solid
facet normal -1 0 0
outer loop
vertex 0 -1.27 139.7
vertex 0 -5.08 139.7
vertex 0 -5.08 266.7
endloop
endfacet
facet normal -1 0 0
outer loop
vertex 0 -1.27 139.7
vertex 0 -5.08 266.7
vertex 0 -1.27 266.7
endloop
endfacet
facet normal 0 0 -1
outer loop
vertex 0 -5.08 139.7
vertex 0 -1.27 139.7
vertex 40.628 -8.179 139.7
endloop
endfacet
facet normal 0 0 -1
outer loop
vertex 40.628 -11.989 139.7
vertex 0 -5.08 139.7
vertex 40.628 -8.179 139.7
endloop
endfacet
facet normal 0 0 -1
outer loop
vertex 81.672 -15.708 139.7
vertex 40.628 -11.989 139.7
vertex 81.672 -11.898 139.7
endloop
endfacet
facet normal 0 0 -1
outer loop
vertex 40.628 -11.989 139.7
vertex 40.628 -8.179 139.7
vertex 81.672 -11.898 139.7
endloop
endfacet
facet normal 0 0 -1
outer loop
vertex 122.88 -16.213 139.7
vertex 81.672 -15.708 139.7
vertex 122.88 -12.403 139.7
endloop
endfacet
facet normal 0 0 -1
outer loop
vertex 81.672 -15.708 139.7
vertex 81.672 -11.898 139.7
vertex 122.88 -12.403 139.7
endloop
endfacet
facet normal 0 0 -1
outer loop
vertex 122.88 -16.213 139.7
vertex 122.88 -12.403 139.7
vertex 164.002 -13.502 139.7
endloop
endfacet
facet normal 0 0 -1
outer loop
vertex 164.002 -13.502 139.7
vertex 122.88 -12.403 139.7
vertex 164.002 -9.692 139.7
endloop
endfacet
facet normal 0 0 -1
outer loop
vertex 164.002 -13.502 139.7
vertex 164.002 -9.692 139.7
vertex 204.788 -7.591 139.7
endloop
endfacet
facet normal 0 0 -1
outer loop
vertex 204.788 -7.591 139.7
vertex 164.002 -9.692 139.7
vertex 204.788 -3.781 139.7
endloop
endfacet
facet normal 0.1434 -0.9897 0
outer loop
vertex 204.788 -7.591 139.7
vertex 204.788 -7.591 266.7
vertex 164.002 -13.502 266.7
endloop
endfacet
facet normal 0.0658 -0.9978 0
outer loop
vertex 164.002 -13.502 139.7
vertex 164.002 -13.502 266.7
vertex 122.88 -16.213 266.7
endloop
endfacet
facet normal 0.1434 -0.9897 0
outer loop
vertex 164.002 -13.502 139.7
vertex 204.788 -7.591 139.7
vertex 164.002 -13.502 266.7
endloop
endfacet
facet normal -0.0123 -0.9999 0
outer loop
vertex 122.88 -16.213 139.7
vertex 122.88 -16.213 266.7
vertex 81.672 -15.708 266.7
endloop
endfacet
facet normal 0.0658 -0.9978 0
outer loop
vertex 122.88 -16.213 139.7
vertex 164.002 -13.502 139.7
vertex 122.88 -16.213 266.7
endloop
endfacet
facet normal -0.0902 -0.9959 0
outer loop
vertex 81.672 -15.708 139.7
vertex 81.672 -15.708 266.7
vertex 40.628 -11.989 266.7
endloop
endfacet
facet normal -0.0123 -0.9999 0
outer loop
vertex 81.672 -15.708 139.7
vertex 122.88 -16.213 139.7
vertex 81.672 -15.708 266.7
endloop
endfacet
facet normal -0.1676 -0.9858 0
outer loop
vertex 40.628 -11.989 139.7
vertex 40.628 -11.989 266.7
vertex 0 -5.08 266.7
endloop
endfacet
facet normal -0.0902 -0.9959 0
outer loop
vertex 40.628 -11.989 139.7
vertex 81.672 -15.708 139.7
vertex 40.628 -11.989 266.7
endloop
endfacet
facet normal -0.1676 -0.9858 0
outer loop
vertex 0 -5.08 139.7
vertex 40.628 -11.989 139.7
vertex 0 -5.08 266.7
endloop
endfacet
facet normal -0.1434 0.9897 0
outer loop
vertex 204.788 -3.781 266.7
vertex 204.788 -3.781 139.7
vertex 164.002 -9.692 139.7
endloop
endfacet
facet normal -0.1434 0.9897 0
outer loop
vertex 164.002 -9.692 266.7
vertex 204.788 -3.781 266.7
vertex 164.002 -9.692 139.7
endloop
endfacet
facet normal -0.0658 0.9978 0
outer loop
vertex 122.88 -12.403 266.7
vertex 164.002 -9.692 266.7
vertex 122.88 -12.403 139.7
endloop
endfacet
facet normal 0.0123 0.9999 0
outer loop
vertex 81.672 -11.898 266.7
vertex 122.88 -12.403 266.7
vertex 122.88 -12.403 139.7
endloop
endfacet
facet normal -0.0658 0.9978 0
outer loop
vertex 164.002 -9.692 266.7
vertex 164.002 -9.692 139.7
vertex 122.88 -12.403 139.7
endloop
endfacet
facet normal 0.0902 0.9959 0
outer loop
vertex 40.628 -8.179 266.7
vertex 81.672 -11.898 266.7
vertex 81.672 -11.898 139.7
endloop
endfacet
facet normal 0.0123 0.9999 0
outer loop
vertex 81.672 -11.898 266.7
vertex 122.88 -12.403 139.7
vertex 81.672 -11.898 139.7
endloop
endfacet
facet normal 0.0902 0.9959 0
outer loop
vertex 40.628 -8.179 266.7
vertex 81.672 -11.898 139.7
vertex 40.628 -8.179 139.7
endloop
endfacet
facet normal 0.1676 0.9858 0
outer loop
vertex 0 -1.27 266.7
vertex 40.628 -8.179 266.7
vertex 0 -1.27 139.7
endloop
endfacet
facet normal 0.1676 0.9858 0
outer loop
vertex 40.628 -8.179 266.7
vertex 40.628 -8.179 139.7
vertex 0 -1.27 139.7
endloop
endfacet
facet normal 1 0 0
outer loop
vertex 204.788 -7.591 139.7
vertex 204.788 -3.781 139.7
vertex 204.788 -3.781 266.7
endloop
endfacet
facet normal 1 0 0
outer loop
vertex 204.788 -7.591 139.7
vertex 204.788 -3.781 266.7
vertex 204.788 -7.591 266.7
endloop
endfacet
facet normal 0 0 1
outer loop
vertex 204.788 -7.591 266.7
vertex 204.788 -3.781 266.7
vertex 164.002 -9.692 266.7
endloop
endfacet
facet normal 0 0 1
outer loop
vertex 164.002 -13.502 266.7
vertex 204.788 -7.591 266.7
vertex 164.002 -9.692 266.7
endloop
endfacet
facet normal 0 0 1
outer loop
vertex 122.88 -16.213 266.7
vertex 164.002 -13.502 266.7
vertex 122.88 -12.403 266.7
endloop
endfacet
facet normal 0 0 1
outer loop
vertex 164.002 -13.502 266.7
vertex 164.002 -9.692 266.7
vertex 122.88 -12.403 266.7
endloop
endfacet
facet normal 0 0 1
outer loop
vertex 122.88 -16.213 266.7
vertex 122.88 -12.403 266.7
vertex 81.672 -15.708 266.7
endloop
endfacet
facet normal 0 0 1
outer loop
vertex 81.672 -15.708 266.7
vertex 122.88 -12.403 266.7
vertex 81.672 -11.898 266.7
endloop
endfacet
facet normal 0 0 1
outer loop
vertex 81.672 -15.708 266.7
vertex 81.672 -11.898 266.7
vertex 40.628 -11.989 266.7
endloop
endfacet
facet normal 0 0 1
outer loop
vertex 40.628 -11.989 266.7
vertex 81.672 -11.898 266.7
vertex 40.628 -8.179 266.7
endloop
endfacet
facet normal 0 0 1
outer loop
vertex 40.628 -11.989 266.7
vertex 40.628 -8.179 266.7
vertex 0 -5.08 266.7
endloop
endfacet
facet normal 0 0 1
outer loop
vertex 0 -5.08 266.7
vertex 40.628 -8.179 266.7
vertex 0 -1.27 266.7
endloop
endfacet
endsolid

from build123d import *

# Parameters (mm, degrees)
BOSS_EXTRUDE1_DEPTH = 266.7
CUT_EXTRUDE1_DEPTH  = 304.8
SKETCH3_W           = 204.7875
SKETCH3_H           = 6.35
SKETCH3_H_2         = 133.35
CUT_EXTRUDE2_DEPTH  = 60.706


with BuildPart() as part:
    # Sketch1 → Boss-Extrude1 (new body)
    with BuildSketch(Plane.XY):
        with BuildLine():
            Line((204.7875, -2.511386267), (204.7875, -7.591386267))
            ThreePointArc((204.7875, -7.591386267), (102.270785822, -16.362635969), (0, -5.08))
            Line((0, -5.08), (0, 0))
            ThreePointArc((0, 0), (102.270785822, -11.282635969), (204.7875, -2.511386267))
        make_face()
    extrude(amount=BOSS_EXTRUDE1_DEPTH)

    # Sketch2 → Cut-Extrude1 (cut)
    with BuildSketch(Plane(origin=(0, 0, 0), x_dir=(-1, 0, 0), z_dir=(0, 0, -1))):
        with BuildLine():
            ThreePointArc((0, 0), (-102.270785822, -11.282635969), (-204.7875, -2.511386267))
            Line((-204.7875, -2.511386267), (-204.7875, -3.781386267))
            ThreePointArc((-204.7875, -3.781386267), (-102.270785822, -12.552635969), (0, -1.27))
            Line((0, -1.27), (0, 0))
        make_face()
    extrude(amount=-CUT_EXTRUDE1_DEPTH, mode=Mode.SUBTRACT)

    # Sketch3 → Cut-Extrude2 (cut)
    with BuildSketch(Plane(origin=(0, 0, 0), x_dir=(1, 0, 0), z_dir=(0, 1, 0))):
        with Locations((102.39375, -136.525)):
            Rectangle(SKETCH3_W, SKETCH3_H)
        with Locations((102.39375, -66.675)):
            Rectangle(SKETCH3_W, SKETCH3_H_2)
    extrude(amount=-CUT_EXTRUDE2_DEPTH, mode=Mode.SUBTRACT)


solid = part.part
